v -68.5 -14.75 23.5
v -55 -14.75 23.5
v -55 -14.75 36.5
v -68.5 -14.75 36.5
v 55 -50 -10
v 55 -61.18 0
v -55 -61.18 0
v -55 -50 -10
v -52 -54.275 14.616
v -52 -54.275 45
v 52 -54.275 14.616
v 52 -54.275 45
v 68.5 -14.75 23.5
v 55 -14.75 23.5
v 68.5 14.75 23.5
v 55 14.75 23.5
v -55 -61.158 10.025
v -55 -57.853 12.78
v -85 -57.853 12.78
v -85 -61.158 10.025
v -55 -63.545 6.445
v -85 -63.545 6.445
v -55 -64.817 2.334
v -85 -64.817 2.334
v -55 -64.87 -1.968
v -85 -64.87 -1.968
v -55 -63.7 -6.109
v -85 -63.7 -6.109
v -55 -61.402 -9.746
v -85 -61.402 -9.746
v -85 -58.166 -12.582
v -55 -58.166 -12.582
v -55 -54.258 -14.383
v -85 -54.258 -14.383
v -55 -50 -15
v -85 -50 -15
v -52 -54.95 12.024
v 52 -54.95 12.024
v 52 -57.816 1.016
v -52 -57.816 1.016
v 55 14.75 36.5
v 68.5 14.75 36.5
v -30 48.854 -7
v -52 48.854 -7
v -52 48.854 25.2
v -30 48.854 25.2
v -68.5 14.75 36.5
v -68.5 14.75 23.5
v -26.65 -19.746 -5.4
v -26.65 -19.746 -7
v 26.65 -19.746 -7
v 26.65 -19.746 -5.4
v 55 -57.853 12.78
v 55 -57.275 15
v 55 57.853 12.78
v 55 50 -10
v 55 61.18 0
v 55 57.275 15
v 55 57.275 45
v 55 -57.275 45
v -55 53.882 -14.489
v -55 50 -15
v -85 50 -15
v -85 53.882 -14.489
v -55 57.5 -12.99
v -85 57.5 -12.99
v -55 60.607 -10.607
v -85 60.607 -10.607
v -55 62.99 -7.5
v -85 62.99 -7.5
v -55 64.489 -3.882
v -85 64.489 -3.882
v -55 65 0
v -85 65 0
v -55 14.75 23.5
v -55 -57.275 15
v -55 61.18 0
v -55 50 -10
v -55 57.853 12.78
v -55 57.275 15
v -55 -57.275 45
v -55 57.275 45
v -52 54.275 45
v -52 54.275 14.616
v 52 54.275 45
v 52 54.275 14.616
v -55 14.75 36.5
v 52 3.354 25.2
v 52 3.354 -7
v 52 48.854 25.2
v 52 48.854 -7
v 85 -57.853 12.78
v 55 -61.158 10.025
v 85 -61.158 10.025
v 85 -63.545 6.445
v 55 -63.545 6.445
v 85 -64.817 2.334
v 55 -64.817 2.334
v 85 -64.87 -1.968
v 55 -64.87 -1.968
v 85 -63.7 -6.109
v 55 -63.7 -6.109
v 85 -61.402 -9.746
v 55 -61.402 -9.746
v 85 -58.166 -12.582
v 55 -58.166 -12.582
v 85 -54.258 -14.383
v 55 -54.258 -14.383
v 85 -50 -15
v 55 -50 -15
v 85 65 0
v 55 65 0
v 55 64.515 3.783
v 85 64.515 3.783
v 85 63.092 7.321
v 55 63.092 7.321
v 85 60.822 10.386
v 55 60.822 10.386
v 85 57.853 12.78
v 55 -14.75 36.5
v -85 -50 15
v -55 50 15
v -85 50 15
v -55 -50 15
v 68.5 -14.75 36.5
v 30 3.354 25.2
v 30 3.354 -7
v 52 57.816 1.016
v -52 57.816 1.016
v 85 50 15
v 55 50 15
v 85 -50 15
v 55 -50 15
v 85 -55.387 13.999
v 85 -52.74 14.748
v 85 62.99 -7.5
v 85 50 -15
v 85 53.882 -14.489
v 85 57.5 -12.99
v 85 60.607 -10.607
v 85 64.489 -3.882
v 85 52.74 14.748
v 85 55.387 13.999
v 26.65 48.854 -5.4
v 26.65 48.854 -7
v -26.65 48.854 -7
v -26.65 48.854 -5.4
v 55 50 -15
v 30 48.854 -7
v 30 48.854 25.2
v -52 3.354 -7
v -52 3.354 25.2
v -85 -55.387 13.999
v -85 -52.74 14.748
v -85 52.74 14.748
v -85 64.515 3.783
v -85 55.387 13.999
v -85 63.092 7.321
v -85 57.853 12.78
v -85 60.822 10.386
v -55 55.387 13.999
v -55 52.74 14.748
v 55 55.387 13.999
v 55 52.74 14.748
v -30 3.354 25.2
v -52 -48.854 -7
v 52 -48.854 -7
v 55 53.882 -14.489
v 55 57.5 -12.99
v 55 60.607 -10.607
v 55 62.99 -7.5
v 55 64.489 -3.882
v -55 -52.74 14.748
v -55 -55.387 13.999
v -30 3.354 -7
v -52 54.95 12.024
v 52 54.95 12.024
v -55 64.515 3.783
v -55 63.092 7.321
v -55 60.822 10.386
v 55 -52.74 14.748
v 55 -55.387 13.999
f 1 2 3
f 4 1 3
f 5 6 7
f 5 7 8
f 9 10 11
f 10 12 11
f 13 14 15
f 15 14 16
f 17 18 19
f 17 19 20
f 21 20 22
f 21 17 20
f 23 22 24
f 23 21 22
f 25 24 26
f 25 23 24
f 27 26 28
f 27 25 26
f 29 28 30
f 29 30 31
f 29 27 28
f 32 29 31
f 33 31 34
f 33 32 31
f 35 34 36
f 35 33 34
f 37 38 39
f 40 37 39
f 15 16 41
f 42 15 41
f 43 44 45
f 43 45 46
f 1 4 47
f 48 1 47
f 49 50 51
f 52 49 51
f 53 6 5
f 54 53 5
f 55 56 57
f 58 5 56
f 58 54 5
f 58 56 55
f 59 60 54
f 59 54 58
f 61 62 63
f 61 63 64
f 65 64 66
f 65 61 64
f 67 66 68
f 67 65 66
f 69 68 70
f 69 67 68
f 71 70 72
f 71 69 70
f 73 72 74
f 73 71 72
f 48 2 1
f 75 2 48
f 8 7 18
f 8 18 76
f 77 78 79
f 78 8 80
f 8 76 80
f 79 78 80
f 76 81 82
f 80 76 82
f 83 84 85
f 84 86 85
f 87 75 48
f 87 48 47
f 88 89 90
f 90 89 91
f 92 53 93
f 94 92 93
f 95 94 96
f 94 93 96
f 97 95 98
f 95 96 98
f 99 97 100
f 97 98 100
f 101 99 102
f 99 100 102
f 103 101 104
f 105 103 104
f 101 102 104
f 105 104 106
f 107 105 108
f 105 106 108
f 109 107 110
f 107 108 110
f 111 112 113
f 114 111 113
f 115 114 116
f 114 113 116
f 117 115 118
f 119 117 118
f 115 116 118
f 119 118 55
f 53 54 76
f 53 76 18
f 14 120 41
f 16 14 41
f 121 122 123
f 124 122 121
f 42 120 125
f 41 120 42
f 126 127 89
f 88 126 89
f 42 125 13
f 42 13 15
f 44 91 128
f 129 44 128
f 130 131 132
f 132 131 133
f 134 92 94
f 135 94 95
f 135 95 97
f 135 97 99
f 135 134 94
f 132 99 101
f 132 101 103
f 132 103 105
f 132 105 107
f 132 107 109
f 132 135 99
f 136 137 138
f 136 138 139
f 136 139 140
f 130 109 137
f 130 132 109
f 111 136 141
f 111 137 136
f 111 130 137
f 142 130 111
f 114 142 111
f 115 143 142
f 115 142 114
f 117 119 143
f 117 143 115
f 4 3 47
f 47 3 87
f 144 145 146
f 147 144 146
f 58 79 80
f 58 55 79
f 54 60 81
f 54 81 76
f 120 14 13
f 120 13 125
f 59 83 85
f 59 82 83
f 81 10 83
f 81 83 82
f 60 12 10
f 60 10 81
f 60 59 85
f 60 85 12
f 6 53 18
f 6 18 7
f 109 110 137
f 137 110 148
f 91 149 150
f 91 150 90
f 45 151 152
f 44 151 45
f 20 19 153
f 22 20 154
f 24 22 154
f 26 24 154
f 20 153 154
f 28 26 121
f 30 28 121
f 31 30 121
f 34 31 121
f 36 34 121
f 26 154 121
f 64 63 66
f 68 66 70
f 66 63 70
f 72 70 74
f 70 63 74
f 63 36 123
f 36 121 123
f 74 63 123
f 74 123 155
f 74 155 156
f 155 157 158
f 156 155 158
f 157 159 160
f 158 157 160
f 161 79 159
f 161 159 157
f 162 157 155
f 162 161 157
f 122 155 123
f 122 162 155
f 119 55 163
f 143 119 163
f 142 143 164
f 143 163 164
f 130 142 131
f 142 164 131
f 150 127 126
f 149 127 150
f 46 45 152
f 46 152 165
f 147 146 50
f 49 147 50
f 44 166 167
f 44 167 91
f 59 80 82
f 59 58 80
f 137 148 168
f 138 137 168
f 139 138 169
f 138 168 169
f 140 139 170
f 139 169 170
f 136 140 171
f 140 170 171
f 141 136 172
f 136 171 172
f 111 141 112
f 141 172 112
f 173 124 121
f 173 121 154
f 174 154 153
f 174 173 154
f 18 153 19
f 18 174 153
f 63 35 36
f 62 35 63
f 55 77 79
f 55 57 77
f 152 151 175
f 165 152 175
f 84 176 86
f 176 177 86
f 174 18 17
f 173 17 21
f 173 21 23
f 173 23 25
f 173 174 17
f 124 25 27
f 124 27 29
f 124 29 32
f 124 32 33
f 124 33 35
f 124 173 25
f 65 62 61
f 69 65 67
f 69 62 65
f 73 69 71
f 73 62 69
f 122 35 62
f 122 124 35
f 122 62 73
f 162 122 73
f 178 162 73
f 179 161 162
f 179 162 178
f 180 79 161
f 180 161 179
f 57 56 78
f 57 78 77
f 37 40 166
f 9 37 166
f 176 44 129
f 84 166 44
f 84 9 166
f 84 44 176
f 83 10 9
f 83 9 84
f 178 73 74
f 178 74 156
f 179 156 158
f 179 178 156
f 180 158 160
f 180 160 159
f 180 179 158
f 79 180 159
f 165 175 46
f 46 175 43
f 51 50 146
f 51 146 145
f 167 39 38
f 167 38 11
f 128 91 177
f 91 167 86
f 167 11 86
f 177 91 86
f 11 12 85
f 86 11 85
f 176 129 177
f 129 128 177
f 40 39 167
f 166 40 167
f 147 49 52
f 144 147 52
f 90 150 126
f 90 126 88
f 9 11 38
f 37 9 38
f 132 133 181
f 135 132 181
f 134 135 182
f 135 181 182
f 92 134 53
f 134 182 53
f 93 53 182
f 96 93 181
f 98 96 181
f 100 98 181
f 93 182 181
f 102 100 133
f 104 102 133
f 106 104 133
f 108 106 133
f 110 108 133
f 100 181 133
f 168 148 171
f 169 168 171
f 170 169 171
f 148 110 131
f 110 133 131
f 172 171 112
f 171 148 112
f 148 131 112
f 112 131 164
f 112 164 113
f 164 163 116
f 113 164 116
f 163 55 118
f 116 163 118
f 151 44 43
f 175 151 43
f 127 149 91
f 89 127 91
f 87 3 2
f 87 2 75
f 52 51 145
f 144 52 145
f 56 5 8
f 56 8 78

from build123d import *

# Parameters (mm, degrees)
F0_W     = 29.5
F0_H     = 13
F1_DEPTH = 55
F2_START = 55
F2_DEPTH = 30
F3_START = -55
F3_DEPTH = 30
F4_T     = -3
F5_W     = 22
F5_H     = 45.5
F6_DEPTH = 32.2
F7_DEPTH = 1.6
F8_START = 55
F8_DEPTH = 13.5
F9_START = -55
F9_DEPTH = 13.5


with BuildPart() as f1:
    # F0 (on Right) → F1 (new body, symmetric)
    with BuildSketch(Plane.YZ):
        with BuildLine():
            Line((0, -10), (38.8196601125, -10))
            ThreePointArc((38.8196601125, -10), (36.3069360624, 6.123724357), (50, 15))
            Line((50, 15), (-50, 15))
            ThreePointArc((-50, 15), (-39.3933982822, 10.6066017178), (-35, 0))
            ThreePointArc((-35, 0), (-35.9874146156, -5.3523313466), (-38.8196601125, -10))
            Line((-38.8196601125, -10), (0, -10))
        make_face()
        with BuildLine():
            ThreePointArc((50, 15), (36.3069360624, 6.123724357), (38.8196601125, -10))
            Line((38.8196601125, -10), (50, -10))
            Line((50, -10), (61.1803398875, 0))
            Line((61.1803398875, 0), (57.8531824307, 12.7799657946))
            ThreePointArc((57.8531824307, 12.7799657946), (54.0804725879, 14.434325182), (50, 15))
        make_face()
        with BuildLine():
            ThreePointArc((-50, 15), (-54.0804725879, 14.434325182), (-57.8531824307, 12.7799657946))
            Line((-57.8531824307, 12.7799657946), (-61.1803398875, 0))
            Line((-61.1803398875, 0), (-50, -10))
            Line((-50, -10), (-38.8196601125, -10))
            ThreePointArc((-38.8196601125, -10), (-35.9874146156, -5.3523313466), (-35, 0))
            ThreePointArc((-35, 0), (-39.3933982822, 10.6066017178), (-50, 15))
        make_face()
        with BuildLine():
            Line((-57.2752150495, 15), (-57.8531824307, 12.7799657946))
            ThreePointArc((-57.8531824307, 12.7799657946), (-54.0804725879, 14.434325182), (-50, 15))
            Line((-50, 15), (-57.2752150495, 15))
        make_face()
        with BuildLine():
            ThreePointArc((50, 15), (54.0804725879, 14.434325182), (57.8531824307, 12.7799657946))
            Line((57.8531824307, 12.7799657946), (57.2752150495, 15))
            Line((57.2752150495, 15), (50, 15))
        make_face()
        Polygon((-50, 15), (50, 15), (57.2752150495, 15), (57.2752150495, 45), (-57.2752150495, 45), (-57.2752150495, 15), align=None)
        with Locations((0, 30)):
            Rectangle(F0_W, F0_H, mode=Mode.SUBTRACT)
        with Locations((0, 30)):
            Rectangle(F0_W, F0_H)
    extrude(amount=F1_DEPTH, both=True)

    # F4
    f4_openings = [f1.faces().sort_by_distance(p)[0] for p in [
        (0, 0, 45),
    ]]
    offset(amount=F4_T, openings=f4_openings, kind=Kind.INTERSECTION)


with BuildPart() as f2:
    # F0 (on Right) → F2 (new body)
    with BuildSketch(Plane.YZ.offset(F2_START)):
        with BuildLine():
            ThreePointArc((-50, 15), (-54.0804725879, 14.434325182), (-57.8531824307, 12.7799657946))
            Line((-57.8531824307, 12.7799657946), (-61.1803398875, 0))
            Line((-61.1803398875, 0), (-50, -10))
            Line((-50, -10), (-38.8196601125, -10))
            ThreePointArc((-38.8196601125, -10), (-35.9874146156, -5.3523313466), (-35, 0))
            ThreePointArc((-35, 0), (-39.3933982822, 10.6066017178), (-50, 15))
        make_face()
        with BuildLine():
            ThreePointArc((-57.8531824307, 12.7799657946), (-64.434325182, -4.0804725879), (-50, -15))
            ThreePointArc((-50, -15), (-43.876275643, -13.6930639376), (-38.8196601125, -10))
            Line((-38.8196601125, -10), (-50, -10))
            Line((-50, -10), (-61.1803398875, 0))
            Line((-61.1803398875, 0), (-57.8531824307, 12.7799657946))
        make_face()
        with BuildLine():
            ThreePointArc((50, 15), (36.3069360624, 6.123724357), (38.8196601125, -10))
            Line((38.8196601125, -10), (50, -10))
            Line((50, -10), (61.1803398875, 0))
            Line((61.1803398875, 0), (57.8531824307, 12.7799657946))
            ThreePointArc((57.8531824307, 12.7799657946), (54.0804725879, 14.434325182), (50, 15))
        make_face()
        with BuildLine():
            Line((0, -10), (38.8196601125, -10))
            ThreePointArc((38.8196601125, -10), (36.3069360624, 6.123724357), (50, 15))
            Line((50, 15), (-50, 15))
            ThreePointArc((-50, 15), (-39.3933982822, 10.6066017178), (-35, 0))
            ThreePointArc((-35, 0), (-35.9874146156, -5.3523313466), (-38.8196601125, -10))
            Line((-38.8196601125, -10), (0, -10))
        make_face()
        with BuildLine():
            ThreePointArc((38.8196601125, -10), (43.876275643, -13.6930639376), (50, -15))
            ThreePointArc((50, -15), (60.6066017178, -10.6066017178), (65, 0))
            ThreePointArc((65, 0), (63.0919390554, 7.3212793807), (57.8531824307, 12.7799657946))
            Line((57.8531824307, 12.7799657946), (61.1803398875, 0))
            Line((61.1803398875, 0), (50, -10))
            Line((50, -10), (38.8196601125, -10))
        make_face()
        with BuildLine():
            Line((-50, -15), (50, -15))
            ThreePointArc((50, -15), (43.876275643, -13.6930639376), (38.8196601125, -10))
            Line((38.8196601125, -10), (0, -10))
            Line((0, -10), (-38.8196601125, -10))
            ThreePointArc((-38.8196601125, -10), (-43.876275643, -13.6930639376), (-50, -15))
        make_face()
    extrude(amount=F2_DEPTH)


with BuildPart() as f3:
    # F0 (on Right) → F3 (new body)
    with BuildSketch(Plane.YZ.offset(F3_START)):
        with BuildLine():
            Line((0, -10), (38.8196601125, -10))
            ThreePointArc((38.8196601125, -10), (36.3069360624, 6.123724357), (50, 15))
            Line((50, 15), (-50, 15))
            ThreePointArc((-50, 15), (-39.3933982822, 10.6066017178), (-35, 0))
            ThreePointArc((-35, 0), (-35.9874146156, -5.3523313466), (-38.8196601125, -10))
            Line((-38.8196601125, -10), (0, -10))
        make_face()
        with BuildLine():
            ThreePointArc((-57.8531824307, 12.7799657946), (-64.434325182, -4.0804725879), (-50, -15))
            ThreePointArc((-50, -15), (-43.876275643, -13.6930639376), (-38.8196601125, -10))
            Line((-38.8196601125, -10), (-50, -10))
            Line((-50, -10), (-61.1803398875, 0))
            Line((-61.1803398875, 0), (-57.8531824307, 12.7799657946))
        make_face()
        with BuildLine():
            ThreePointArc((38.8196601125, -10), (43.876275643, -13.6930639376), (50, -15))
            ThreePointArc((50, -15), (60.6066017178, -10.6066017178), (65, 0))
            ThreePointArc((65, 0), (63.0919390554, 7.3212793807), (57.8531824307, 12.7799657946))
            Line((57.8531824307, 12.7799657946), (61.1803398875, 0))
            Line((61.1803398875, 0), (50, -10))
            Line((50, -10), (38.8196601125, -10))
        make_face()
        with BuildLine():
            ThreePointArc((50, 15), (36.3069360624, 6.123724357), (38.8196601125, -10))
            Line((38.8196601125, -10), (50, -10))
            Line((50, -10), (61.1803398875, 0))
            Line((61.1803398875, 0), (57.8531824307, 12.7799657946))
            ThreePointArc((57.8531824307, 12.7799657946), (54.0804725879, 14.434325182), (50, 15))
        make_face()
        with BuildLine():
            Line((-50, -15), (50, -15))
            ThreePointArc((50, -15), (43.876275643, -13.6930639376), (38.8196601125, -10))
            Line((38.8196601125, -10), (0, -10))
            Line((0, -10), (-38.8196601125, -10))
            ThreePointArc((-38.8196601125, -10), (-43.876275643, -13.6930639376), (-50, -15))
        make_face()
        with BuildLine():
            ThreePointArc((-50, 15), (-54.0804725879, 14.434325182), (-57.8531824307, 12.7799657946))
            Line((-57.8531824307, 12.7799657946), (-61.1803398875, 0))
            Line((-61.1803398875, 0), (-50, -10))
            Line((-50, -10), (-38.8196601125, -10))
            ThreePointArc((-38.8196601125, -10), (-35.9874146156, -5.3523313466), (-35, 0))
            ThreePointArc((-35, 0), (-39.3933982822, 10.6066017178), (-50, 15))
        make_face()
    extrude(amount=-F3_DEPTH)


with BuildPart() as f6:
    # F5 (on face) → F6 (new body)
    with BuildSketch(Plane.XY.offset(-7)):
        with Locations((-41, 26.1041019662)):
            Rectangle(F5_W, F5_H)
    extrude(amount=F6_DEPTH)


with BuildPart() as f6b:
    # F5 (on face) → F6, piece 2 (new body)
    with BuildSketch(Plane.XY.offset(-7)):
        with Locations((41, 26.1041019662)):
            Rectangle(F5_W, F5_H)
    extrude(amount=F6_DEPTH)


with BuildPart() as f7:
    # F5 (on face) → F7 (new body)
    with BuildSketch(Plane.XY.offset(-7)):
        Polygon((0, 48.8541019662), (-26.65, 48.8541019662), (-26.65, -19.7458980338), (26.65, -19.7458980338), (26.65, 48.8541019662), align=None)
    extrude(amount=F7_DEPTH)


with BuildPart() as f8:
    # F0 (on Right) → F8 (new body)
    with BuildSketch(Plane.YZ.offset(F8_START)):
        with Locations((0, 30)):
            Rectangle(F0_W, F0_H)
    extrude(amount=F8_DEPTH)


with BuildPart() as f9:
    # F0 (on Right) → F9 (new body)
    with BuildSketch(Plane.YZ.offset(F9_START)):
        with Locations((0, 30)):
            Rectangle(F0_W, F0_H)
    extrude(amount=-F9_DEPTH)


solid = Compound([f1.part, f2.part, f3.part, f6.part, f6b.part, f7.part, f8.part, f9.part])
